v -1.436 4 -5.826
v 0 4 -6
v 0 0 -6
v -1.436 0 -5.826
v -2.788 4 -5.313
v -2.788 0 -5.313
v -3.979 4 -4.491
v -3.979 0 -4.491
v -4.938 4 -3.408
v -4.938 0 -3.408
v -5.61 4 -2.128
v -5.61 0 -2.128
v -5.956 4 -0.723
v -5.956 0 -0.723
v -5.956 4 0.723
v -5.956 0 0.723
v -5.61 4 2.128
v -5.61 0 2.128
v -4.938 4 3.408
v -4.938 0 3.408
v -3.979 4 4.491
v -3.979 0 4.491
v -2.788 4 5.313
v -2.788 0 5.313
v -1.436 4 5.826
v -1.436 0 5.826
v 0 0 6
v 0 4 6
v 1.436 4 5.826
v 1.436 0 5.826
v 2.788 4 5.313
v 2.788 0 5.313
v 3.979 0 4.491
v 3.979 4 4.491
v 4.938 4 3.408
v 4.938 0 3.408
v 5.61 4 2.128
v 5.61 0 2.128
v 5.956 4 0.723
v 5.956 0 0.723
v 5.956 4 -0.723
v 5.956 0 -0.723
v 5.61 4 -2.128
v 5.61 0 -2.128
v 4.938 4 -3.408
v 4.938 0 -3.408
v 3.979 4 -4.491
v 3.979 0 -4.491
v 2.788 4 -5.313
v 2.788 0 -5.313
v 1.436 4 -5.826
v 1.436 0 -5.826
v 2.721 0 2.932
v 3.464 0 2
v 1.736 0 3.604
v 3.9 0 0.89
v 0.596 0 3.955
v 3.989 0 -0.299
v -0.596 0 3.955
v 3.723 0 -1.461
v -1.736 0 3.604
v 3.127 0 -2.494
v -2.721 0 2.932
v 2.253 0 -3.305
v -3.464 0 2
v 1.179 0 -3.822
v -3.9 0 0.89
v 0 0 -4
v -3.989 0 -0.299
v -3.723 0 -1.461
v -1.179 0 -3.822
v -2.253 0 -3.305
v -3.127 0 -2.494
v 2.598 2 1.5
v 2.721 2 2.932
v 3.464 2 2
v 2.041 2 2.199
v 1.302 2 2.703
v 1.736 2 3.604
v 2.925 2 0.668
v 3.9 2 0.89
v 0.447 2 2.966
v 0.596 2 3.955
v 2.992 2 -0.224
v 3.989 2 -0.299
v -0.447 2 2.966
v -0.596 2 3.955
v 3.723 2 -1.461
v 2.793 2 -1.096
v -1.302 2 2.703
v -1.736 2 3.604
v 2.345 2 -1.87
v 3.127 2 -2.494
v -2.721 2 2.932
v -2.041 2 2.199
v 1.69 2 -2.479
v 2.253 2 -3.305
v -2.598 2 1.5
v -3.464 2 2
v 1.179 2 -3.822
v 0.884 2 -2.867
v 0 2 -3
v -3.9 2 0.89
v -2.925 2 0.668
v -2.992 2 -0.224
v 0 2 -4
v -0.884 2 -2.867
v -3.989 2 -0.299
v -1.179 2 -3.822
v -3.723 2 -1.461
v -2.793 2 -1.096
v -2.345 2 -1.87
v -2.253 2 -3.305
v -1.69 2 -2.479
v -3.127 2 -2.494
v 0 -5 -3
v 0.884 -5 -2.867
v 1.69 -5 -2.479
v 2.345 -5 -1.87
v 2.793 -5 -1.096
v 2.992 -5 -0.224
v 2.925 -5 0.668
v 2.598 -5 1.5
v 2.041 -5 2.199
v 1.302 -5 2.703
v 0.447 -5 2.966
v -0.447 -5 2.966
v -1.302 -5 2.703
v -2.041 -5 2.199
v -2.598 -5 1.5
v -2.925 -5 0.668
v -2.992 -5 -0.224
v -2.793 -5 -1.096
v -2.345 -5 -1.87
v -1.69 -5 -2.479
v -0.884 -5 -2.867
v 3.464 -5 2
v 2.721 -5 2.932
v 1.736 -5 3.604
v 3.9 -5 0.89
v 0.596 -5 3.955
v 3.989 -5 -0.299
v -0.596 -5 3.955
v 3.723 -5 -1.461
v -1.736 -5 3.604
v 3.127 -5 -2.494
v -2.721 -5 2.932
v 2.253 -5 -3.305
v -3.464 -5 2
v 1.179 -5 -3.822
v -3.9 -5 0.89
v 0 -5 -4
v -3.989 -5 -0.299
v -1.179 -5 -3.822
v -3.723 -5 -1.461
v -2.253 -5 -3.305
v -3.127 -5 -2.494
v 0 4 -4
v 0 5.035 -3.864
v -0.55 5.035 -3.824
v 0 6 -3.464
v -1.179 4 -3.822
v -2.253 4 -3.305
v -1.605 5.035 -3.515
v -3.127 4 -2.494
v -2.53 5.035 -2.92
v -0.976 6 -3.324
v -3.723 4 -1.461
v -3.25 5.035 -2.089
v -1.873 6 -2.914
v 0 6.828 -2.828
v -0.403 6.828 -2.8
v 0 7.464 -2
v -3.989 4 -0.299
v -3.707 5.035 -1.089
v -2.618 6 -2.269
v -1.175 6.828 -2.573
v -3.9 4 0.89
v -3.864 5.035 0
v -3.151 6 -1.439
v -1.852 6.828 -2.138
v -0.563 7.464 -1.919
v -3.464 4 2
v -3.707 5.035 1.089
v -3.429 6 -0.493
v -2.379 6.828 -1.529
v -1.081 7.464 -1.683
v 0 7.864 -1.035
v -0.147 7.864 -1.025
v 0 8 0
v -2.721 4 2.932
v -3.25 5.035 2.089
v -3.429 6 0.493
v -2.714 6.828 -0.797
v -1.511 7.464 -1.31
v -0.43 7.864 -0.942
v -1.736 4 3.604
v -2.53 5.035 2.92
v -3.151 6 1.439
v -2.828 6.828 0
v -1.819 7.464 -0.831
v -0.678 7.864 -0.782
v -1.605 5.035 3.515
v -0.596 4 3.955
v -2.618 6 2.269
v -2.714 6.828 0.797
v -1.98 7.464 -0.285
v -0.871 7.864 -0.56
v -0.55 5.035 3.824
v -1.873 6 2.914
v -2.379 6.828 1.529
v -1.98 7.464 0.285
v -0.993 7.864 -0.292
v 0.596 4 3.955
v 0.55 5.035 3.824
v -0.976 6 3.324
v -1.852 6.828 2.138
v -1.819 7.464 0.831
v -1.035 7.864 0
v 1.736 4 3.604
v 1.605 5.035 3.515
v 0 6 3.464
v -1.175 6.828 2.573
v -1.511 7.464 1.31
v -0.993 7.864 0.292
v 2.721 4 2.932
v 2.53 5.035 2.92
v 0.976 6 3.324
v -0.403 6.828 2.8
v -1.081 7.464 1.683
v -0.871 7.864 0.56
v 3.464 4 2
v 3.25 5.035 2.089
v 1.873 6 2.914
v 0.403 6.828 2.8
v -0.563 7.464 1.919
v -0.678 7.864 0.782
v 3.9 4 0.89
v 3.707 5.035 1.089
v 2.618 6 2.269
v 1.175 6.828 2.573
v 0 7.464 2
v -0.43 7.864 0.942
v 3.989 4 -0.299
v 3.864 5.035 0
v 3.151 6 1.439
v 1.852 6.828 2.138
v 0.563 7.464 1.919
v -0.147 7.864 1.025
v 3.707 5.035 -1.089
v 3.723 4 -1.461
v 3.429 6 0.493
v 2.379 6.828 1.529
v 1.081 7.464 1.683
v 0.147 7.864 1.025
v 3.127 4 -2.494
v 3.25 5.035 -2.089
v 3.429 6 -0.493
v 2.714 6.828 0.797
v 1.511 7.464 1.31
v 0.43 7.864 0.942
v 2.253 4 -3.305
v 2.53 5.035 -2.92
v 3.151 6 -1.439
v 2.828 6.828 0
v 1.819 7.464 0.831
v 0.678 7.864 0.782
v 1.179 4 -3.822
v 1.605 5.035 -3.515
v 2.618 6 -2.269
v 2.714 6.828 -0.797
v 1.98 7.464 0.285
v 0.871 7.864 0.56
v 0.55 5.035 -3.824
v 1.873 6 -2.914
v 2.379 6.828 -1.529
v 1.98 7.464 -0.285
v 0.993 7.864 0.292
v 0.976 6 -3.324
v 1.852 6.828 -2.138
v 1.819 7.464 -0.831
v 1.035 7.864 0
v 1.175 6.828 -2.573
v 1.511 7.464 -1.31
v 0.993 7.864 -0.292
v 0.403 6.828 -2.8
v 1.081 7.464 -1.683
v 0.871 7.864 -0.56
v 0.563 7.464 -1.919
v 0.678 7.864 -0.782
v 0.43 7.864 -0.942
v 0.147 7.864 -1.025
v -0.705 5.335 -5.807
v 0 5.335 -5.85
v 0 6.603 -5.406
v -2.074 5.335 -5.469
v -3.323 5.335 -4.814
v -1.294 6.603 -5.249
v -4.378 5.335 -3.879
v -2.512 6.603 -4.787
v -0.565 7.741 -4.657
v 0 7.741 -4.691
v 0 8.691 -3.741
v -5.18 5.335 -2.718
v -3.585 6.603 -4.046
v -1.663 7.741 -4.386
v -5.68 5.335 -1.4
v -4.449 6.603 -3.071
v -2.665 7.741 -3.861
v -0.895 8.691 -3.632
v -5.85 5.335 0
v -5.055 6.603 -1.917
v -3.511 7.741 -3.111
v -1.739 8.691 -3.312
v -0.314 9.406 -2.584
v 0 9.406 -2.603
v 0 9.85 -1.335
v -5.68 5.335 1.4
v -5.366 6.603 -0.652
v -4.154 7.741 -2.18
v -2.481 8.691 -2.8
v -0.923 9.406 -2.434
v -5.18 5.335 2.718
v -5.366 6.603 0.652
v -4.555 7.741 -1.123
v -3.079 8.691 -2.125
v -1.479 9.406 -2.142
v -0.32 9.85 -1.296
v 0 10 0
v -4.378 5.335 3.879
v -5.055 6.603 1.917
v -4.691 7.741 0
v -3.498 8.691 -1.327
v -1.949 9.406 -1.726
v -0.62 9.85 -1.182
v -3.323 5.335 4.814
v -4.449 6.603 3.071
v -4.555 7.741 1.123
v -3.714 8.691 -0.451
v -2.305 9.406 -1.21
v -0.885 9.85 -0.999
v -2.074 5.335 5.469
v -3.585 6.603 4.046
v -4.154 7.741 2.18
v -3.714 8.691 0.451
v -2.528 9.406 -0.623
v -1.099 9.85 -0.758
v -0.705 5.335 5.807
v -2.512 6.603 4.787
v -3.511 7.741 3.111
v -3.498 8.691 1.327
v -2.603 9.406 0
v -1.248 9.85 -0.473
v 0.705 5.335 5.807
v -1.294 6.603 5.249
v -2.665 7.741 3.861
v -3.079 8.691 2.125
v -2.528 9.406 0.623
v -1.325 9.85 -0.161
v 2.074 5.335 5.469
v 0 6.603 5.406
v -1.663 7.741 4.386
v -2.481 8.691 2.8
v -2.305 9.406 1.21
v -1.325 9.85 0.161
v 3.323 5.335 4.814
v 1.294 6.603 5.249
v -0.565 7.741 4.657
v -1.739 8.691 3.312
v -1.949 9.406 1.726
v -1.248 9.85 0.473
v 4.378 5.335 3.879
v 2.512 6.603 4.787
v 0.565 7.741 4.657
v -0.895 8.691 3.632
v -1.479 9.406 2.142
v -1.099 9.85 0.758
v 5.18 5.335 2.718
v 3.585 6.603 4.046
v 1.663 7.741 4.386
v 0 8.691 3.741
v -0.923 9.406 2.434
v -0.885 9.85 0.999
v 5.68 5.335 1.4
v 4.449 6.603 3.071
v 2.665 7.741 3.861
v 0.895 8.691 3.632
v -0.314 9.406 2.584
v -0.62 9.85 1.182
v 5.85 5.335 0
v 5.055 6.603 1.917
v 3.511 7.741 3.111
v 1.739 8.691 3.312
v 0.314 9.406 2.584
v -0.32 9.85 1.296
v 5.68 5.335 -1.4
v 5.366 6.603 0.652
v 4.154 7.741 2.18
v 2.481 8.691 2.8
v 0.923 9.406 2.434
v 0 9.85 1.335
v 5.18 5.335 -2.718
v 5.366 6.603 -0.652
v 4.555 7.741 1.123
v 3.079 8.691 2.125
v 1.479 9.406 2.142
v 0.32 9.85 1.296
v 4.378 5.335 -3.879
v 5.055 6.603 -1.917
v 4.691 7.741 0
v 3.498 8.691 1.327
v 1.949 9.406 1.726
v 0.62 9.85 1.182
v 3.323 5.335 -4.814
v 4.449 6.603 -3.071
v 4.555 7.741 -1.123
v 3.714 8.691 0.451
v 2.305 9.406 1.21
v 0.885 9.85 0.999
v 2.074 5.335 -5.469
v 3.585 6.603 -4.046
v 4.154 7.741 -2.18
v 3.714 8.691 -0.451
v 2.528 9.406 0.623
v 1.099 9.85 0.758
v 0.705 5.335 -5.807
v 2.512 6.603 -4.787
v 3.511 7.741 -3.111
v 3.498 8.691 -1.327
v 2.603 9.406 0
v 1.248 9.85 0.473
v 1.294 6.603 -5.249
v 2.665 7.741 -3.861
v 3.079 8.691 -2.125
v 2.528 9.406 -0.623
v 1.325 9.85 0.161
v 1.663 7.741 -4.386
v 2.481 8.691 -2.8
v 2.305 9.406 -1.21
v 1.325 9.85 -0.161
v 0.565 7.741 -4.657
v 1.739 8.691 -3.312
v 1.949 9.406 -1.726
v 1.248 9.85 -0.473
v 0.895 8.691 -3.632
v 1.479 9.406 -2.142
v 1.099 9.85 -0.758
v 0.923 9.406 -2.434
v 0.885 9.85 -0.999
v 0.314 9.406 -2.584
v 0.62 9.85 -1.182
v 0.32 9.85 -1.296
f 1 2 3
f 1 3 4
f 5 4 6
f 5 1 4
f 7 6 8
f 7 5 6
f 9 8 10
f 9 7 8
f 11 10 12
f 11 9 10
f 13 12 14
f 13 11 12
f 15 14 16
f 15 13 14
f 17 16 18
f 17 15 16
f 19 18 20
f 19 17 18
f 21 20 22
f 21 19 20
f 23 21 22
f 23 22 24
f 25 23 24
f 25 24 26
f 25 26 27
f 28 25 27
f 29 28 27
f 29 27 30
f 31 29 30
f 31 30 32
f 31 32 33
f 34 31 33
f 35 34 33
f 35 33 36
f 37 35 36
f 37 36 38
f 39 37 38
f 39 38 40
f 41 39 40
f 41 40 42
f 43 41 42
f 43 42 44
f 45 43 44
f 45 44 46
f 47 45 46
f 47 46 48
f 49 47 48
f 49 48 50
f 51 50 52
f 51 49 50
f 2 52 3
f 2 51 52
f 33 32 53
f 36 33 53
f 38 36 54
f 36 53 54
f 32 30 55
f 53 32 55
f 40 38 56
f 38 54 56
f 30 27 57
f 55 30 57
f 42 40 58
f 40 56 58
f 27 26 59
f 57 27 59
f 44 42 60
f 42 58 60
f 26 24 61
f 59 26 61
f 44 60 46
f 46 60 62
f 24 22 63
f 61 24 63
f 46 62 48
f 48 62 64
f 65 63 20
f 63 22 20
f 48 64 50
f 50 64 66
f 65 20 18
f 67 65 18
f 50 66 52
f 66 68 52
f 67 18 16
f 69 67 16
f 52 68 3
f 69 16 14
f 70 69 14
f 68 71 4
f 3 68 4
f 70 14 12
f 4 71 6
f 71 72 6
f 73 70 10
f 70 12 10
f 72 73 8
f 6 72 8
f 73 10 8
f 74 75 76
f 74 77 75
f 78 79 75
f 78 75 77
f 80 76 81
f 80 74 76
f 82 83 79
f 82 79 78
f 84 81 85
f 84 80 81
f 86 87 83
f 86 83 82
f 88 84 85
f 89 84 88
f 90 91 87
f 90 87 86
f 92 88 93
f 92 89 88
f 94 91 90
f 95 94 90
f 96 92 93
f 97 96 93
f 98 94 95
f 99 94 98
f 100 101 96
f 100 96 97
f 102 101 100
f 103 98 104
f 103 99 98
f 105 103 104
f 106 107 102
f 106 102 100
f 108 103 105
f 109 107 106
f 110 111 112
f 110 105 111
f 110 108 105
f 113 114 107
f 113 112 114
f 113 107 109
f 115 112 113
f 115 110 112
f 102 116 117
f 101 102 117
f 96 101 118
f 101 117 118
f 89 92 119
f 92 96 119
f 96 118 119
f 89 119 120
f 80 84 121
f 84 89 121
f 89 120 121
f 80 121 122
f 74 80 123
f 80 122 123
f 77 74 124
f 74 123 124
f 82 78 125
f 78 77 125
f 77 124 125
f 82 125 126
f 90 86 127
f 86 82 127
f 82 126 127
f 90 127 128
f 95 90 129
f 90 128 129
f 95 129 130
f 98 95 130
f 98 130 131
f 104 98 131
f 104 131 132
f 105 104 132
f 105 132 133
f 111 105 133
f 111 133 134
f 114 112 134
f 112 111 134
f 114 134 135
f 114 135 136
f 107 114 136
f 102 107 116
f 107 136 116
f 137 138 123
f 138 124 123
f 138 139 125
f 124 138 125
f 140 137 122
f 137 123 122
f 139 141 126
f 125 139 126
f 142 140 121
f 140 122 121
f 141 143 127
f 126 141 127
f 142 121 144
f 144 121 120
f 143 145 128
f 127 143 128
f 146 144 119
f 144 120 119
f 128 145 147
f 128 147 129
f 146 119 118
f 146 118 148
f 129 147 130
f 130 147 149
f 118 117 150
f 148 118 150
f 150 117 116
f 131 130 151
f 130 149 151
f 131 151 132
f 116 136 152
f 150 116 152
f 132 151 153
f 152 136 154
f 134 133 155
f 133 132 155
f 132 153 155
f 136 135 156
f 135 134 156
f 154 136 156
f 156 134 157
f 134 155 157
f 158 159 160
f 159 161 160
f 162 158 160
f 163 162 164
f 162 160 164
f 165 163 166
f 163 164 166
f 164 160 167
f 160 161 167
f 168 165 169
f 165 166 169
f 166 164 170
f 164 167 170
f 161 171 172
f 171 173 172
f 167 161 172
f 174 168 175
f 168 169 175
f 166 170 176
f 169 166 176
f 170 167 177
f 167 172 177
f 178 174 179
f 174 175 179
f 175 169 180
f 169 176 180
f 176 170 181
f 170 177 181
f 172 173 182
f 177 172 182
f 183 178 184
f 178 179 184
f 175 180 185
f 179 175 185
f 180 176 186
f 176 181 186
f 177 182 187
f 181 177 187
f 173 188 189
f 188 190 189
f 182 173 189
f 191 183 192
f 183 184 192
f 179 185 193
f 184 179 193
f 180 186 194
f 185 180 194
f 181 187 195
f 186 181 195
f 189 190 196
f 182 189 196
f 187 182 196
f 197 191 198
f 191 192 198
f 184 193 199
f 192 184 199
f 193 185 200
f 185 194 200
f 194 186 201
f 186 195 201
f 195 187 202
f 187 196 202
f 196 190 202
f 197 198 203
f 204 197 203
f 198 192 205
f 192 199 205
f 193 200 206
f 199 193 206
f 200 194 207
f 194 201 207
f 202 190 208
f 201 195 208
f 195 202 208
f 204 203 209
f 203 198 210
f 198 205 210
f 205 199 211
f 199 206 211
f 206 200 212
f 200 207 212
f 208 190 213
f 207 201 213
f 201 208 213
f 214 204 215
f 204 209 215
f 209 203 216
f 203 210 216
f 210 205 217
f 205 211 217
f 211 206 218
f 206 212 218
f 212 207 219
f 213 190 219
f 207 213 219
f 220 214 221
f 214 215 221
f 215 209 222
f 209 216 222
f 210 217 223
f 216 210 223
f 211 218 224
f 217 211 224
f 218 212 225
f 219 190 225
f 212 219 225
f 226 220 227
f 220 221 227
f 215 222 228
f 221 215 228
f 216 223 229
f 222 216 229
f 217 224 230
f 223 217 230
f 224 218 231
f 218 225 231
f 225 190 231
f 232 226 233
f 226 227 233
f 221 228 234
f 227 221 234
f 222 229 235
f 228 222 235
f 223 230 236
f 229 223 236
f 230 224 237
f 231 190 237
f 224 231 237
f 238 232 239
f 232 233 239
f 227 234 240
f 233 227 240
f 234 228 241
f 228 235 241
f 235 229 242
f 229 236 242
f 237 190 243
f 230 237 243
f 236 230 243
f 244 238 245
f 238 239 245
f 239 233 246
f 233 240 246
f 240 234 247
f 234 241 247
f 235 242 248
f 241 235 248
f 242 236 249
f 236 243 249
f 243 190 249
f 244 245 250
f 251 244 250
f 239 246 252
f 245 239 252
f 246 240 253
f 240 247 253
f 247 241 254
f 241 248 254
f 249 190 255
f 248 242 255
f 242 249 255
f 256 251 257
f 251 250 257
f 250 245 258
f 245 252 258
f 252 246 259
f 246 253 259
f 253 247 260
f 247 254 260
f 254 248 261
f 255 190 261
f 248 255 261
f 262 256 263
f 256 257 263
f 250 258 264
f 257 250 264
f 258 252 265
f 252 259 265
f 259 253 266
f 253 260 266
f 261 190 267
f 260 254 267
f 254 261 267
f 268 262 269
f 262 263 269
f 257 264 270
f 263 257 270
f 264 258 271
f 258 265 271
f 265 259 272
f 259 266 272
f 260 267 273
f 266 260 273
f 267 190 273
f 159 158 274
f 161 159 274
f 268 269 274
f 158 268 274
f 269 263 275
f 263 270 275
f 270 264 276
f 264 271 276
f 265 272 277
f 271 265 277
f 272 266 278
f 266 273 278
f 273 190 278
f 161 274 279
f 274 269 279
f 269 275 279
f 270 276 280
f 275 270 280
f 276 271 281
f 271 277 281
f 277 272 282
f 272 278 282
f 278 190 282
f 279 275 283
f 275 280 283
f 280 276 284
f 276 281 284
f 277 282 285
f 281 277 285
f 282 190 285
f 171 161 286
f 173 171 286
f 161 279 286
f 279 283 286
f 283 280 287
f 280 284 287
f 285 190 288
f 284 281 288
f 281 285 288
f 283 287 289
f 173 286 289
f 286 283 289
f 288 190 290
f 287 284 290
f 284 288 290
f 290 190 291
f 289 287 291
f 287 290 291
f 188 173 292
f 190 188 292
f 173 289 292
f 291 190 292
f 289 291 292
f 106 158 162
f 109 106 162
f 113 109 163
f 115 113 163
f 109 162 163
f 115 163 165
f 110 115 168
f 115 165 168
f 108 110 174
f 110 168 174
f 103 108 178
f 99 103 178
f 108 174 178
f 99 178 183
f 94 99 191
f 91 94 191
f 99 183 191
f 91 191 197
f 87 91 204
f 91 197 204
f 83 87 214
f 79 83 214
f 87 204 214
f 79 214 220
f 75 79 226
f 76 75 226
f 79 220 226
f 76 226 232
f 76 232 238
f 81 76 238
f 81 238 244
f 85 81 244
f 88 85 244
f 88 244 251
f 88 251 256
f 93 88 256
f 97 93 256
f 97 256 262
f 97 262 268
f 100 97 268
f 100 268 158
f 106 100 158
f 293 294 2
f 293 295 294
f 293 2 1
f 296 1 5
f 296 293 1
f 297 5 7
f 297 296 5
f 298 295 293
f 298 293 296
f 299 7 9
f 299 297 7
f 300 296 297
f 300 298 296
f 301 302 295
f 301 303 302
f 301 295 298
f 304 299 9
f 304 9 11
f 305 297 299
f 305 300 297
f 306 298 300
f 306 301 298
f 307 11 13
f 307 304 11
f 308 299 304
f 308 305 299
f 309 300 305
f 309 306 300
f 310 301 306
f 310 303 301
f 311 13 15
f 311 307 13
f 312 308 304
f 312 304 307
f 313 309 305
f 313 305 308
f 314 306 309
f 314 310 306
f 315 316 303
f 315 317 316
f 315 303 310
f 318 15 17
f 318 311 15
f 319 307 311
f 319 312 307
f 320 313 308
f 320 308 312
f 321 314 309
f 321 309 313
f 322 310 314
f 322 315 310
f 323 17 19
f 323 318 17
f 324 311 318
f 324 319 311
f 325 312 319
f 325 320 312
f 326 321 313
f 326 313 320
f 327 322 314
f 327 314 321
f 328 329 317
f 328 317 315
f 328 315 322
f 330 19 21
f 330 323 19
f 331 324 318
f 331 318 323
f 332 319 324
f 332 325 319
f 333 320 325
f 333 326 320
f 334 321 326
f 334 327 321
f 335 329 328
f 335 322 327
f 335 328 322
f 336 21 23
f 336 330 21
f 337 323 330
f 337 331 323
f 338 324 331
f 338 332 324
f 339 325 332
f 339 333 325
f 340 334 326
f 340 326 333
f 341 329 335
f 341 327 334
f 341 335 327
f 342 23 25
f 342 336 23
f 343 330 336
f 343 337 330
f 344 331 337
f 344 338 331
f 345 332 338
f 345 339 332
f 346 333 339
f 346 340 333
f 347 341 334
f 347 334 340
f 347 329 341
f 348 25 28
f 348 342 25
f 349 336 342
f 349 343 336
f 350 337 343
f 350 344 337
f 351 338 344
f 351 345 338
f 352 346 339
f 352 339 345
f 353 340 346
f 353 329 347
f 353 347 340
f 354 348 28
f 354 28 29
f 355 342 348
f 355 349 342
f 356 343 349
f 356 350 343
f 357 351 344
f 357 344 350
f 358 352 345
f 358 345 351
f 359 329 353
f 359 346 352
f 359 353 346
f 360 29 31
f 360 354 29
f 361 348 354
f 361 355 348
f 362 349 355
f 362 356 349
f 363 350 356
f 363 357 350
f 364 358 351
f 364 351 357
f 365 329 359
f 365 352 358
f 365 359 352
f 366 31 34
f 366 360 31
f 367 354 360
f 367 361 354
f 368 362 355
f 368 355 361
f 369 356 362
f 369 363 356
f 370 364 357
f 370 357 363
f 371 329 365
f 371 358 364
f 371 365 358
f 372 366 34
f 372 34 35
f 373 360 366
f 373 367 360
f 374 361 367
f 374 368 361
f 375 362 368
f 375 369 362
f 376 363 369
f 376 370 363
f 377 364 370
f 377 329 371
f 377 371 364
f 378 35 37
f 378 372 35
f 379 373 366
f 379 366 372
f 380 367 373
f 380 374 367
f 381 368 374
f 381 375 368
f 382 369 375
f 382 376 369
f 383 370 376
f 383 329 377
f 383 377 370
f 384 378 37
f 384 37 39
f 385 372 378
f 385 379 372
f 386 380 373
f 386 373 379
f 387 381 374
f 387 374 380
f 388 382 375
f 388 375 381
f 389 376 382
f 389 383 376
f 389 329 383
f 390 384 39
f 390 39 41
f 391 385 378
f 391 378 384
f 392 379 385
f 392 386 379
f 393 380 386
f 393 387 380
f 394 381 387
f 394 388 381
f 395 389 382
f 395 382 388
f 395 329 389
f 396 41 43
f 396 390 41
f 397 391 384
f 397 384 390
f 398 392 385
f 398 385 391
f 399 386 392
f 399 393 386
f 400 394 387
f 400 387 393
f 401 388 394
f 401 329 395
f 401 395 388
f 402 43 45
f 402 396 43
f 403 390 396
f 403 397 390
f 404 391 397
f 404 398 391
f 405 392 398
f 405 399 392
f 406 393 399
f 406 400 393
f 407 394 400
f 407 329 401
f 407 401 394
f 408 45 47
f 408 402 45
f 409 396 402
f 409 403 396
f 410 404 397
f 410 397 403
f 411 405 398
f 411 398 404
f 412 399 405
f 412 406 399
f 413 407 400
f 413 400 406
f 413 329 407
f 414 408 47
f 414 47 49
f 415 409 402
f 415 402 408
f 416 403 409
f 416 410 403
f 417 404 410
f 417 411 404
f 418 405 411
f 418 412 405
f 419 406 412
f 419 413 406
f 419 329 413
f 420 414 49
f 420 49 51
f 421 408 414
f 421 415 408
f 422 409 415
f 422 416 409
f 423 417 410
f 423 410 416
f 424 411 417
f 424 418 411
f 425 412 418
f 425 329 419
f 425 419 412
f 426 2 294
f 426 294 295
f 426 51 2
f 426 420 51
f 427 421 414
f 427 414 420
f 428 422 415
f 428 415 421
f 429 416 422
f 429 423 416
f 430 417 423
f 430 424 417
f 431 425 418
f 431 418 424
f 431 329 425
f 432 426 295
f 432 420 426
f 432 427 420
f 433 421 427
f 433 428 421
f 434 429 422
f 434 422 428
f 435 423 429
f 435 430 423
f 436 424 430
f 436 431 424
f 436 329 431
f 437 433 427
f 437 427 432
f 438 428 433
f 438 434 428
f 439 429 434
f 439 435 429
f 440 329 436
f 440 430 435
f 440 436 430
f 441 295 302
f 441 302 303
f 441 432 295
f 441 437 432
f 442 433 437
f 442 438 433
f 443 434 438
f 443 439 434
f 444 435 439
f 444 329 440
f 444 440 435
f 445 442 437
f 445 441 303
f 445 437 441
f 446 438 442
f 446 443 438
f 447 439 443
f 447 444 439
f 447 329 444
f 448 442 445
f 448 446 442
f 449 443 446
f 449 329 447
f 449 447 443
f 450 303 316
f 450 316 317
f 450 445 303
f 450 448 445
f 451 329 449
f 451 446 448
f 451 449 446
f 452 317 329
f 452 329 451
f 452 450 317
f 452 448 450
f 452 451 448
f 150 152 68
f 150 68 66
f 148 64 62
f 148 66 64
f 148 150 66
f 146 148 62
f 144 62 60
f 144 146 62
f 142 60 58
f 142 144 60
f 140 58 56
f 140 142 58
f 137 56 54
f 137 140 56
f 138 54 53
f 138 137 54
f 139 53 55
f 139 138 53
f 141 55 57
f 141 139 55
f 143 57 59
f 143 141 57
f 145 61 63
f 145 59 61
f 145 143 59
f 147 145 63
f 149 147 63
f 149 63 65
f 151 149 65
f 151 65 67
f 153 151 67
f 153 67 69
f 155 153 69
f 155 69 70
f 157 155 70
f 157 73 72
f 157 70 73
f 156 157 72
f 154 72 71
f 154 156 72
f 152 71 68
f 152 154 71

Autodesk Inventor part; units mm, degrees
ref_plane "YZ Plane" through (0, 0, 0) normal (1, 0, 0) x (0, 1, 0)
ref_plane "XZ Plane" through (0, 0, 0) normal (0, 1, 0) x (-1, 0, 0)
ref_plane "XY Plane" through (0, 0, 0) normal (0, 0, 1) x (1, 0, 0)
sketch "Sketch1" plane through (0, 0, 0) normal (1, 0, 0) x (0, 1, 0)
  line L0 (0, 6) -> (4, 6)
  line L1 (0, -6) -> (4, -6)
  arc A0 (4, -6) -> (4, 6) centre (4, 0) ccw
  line L2 (0, 6) -> (0, 4)
  line L3 (0, 4) -> (-5, 4)
  line L4 (0, -6) -> (0, -4)
  line L5 (0, -4) -> (-5, -4)
  arc A1 (4, -4) -> (4, 4) centre (4, 0) ccw
  line L6 (2, 4) -> (4, 4)
  line L7 (2, -4) -> (4, -4)
  line L8 (2, -4) -> (2, -3)
  line L9 (2, -3) -> (-5, -3)
  line L10 (2, 4) -> (2, 3)
  line L11 (2, 3) -> (-5, 3)
  line L12 (-5, 4) -> (-5, 3)
  line L13 (-5, -3) -> (-5, -4)
  line L14 (-5, 0) -> (10, 0)
  point P0 (0, 0)
  point P1 (8, 0)
  dimension "d0" = 4
  dimension "d1" = 2
  dimension "d2" = 5
  dimension "d3" = 2
  dimension "d4" = 1
  dimension "d5" = 1
revolve "Revolution1" add sketch "Sketch1" angle 360 about axis through (0, -5, 0) along (0, 1, 0) contours A0 L1 L4 L5 L13 L9 L8 L7 A1 L14
properties part number "head"
